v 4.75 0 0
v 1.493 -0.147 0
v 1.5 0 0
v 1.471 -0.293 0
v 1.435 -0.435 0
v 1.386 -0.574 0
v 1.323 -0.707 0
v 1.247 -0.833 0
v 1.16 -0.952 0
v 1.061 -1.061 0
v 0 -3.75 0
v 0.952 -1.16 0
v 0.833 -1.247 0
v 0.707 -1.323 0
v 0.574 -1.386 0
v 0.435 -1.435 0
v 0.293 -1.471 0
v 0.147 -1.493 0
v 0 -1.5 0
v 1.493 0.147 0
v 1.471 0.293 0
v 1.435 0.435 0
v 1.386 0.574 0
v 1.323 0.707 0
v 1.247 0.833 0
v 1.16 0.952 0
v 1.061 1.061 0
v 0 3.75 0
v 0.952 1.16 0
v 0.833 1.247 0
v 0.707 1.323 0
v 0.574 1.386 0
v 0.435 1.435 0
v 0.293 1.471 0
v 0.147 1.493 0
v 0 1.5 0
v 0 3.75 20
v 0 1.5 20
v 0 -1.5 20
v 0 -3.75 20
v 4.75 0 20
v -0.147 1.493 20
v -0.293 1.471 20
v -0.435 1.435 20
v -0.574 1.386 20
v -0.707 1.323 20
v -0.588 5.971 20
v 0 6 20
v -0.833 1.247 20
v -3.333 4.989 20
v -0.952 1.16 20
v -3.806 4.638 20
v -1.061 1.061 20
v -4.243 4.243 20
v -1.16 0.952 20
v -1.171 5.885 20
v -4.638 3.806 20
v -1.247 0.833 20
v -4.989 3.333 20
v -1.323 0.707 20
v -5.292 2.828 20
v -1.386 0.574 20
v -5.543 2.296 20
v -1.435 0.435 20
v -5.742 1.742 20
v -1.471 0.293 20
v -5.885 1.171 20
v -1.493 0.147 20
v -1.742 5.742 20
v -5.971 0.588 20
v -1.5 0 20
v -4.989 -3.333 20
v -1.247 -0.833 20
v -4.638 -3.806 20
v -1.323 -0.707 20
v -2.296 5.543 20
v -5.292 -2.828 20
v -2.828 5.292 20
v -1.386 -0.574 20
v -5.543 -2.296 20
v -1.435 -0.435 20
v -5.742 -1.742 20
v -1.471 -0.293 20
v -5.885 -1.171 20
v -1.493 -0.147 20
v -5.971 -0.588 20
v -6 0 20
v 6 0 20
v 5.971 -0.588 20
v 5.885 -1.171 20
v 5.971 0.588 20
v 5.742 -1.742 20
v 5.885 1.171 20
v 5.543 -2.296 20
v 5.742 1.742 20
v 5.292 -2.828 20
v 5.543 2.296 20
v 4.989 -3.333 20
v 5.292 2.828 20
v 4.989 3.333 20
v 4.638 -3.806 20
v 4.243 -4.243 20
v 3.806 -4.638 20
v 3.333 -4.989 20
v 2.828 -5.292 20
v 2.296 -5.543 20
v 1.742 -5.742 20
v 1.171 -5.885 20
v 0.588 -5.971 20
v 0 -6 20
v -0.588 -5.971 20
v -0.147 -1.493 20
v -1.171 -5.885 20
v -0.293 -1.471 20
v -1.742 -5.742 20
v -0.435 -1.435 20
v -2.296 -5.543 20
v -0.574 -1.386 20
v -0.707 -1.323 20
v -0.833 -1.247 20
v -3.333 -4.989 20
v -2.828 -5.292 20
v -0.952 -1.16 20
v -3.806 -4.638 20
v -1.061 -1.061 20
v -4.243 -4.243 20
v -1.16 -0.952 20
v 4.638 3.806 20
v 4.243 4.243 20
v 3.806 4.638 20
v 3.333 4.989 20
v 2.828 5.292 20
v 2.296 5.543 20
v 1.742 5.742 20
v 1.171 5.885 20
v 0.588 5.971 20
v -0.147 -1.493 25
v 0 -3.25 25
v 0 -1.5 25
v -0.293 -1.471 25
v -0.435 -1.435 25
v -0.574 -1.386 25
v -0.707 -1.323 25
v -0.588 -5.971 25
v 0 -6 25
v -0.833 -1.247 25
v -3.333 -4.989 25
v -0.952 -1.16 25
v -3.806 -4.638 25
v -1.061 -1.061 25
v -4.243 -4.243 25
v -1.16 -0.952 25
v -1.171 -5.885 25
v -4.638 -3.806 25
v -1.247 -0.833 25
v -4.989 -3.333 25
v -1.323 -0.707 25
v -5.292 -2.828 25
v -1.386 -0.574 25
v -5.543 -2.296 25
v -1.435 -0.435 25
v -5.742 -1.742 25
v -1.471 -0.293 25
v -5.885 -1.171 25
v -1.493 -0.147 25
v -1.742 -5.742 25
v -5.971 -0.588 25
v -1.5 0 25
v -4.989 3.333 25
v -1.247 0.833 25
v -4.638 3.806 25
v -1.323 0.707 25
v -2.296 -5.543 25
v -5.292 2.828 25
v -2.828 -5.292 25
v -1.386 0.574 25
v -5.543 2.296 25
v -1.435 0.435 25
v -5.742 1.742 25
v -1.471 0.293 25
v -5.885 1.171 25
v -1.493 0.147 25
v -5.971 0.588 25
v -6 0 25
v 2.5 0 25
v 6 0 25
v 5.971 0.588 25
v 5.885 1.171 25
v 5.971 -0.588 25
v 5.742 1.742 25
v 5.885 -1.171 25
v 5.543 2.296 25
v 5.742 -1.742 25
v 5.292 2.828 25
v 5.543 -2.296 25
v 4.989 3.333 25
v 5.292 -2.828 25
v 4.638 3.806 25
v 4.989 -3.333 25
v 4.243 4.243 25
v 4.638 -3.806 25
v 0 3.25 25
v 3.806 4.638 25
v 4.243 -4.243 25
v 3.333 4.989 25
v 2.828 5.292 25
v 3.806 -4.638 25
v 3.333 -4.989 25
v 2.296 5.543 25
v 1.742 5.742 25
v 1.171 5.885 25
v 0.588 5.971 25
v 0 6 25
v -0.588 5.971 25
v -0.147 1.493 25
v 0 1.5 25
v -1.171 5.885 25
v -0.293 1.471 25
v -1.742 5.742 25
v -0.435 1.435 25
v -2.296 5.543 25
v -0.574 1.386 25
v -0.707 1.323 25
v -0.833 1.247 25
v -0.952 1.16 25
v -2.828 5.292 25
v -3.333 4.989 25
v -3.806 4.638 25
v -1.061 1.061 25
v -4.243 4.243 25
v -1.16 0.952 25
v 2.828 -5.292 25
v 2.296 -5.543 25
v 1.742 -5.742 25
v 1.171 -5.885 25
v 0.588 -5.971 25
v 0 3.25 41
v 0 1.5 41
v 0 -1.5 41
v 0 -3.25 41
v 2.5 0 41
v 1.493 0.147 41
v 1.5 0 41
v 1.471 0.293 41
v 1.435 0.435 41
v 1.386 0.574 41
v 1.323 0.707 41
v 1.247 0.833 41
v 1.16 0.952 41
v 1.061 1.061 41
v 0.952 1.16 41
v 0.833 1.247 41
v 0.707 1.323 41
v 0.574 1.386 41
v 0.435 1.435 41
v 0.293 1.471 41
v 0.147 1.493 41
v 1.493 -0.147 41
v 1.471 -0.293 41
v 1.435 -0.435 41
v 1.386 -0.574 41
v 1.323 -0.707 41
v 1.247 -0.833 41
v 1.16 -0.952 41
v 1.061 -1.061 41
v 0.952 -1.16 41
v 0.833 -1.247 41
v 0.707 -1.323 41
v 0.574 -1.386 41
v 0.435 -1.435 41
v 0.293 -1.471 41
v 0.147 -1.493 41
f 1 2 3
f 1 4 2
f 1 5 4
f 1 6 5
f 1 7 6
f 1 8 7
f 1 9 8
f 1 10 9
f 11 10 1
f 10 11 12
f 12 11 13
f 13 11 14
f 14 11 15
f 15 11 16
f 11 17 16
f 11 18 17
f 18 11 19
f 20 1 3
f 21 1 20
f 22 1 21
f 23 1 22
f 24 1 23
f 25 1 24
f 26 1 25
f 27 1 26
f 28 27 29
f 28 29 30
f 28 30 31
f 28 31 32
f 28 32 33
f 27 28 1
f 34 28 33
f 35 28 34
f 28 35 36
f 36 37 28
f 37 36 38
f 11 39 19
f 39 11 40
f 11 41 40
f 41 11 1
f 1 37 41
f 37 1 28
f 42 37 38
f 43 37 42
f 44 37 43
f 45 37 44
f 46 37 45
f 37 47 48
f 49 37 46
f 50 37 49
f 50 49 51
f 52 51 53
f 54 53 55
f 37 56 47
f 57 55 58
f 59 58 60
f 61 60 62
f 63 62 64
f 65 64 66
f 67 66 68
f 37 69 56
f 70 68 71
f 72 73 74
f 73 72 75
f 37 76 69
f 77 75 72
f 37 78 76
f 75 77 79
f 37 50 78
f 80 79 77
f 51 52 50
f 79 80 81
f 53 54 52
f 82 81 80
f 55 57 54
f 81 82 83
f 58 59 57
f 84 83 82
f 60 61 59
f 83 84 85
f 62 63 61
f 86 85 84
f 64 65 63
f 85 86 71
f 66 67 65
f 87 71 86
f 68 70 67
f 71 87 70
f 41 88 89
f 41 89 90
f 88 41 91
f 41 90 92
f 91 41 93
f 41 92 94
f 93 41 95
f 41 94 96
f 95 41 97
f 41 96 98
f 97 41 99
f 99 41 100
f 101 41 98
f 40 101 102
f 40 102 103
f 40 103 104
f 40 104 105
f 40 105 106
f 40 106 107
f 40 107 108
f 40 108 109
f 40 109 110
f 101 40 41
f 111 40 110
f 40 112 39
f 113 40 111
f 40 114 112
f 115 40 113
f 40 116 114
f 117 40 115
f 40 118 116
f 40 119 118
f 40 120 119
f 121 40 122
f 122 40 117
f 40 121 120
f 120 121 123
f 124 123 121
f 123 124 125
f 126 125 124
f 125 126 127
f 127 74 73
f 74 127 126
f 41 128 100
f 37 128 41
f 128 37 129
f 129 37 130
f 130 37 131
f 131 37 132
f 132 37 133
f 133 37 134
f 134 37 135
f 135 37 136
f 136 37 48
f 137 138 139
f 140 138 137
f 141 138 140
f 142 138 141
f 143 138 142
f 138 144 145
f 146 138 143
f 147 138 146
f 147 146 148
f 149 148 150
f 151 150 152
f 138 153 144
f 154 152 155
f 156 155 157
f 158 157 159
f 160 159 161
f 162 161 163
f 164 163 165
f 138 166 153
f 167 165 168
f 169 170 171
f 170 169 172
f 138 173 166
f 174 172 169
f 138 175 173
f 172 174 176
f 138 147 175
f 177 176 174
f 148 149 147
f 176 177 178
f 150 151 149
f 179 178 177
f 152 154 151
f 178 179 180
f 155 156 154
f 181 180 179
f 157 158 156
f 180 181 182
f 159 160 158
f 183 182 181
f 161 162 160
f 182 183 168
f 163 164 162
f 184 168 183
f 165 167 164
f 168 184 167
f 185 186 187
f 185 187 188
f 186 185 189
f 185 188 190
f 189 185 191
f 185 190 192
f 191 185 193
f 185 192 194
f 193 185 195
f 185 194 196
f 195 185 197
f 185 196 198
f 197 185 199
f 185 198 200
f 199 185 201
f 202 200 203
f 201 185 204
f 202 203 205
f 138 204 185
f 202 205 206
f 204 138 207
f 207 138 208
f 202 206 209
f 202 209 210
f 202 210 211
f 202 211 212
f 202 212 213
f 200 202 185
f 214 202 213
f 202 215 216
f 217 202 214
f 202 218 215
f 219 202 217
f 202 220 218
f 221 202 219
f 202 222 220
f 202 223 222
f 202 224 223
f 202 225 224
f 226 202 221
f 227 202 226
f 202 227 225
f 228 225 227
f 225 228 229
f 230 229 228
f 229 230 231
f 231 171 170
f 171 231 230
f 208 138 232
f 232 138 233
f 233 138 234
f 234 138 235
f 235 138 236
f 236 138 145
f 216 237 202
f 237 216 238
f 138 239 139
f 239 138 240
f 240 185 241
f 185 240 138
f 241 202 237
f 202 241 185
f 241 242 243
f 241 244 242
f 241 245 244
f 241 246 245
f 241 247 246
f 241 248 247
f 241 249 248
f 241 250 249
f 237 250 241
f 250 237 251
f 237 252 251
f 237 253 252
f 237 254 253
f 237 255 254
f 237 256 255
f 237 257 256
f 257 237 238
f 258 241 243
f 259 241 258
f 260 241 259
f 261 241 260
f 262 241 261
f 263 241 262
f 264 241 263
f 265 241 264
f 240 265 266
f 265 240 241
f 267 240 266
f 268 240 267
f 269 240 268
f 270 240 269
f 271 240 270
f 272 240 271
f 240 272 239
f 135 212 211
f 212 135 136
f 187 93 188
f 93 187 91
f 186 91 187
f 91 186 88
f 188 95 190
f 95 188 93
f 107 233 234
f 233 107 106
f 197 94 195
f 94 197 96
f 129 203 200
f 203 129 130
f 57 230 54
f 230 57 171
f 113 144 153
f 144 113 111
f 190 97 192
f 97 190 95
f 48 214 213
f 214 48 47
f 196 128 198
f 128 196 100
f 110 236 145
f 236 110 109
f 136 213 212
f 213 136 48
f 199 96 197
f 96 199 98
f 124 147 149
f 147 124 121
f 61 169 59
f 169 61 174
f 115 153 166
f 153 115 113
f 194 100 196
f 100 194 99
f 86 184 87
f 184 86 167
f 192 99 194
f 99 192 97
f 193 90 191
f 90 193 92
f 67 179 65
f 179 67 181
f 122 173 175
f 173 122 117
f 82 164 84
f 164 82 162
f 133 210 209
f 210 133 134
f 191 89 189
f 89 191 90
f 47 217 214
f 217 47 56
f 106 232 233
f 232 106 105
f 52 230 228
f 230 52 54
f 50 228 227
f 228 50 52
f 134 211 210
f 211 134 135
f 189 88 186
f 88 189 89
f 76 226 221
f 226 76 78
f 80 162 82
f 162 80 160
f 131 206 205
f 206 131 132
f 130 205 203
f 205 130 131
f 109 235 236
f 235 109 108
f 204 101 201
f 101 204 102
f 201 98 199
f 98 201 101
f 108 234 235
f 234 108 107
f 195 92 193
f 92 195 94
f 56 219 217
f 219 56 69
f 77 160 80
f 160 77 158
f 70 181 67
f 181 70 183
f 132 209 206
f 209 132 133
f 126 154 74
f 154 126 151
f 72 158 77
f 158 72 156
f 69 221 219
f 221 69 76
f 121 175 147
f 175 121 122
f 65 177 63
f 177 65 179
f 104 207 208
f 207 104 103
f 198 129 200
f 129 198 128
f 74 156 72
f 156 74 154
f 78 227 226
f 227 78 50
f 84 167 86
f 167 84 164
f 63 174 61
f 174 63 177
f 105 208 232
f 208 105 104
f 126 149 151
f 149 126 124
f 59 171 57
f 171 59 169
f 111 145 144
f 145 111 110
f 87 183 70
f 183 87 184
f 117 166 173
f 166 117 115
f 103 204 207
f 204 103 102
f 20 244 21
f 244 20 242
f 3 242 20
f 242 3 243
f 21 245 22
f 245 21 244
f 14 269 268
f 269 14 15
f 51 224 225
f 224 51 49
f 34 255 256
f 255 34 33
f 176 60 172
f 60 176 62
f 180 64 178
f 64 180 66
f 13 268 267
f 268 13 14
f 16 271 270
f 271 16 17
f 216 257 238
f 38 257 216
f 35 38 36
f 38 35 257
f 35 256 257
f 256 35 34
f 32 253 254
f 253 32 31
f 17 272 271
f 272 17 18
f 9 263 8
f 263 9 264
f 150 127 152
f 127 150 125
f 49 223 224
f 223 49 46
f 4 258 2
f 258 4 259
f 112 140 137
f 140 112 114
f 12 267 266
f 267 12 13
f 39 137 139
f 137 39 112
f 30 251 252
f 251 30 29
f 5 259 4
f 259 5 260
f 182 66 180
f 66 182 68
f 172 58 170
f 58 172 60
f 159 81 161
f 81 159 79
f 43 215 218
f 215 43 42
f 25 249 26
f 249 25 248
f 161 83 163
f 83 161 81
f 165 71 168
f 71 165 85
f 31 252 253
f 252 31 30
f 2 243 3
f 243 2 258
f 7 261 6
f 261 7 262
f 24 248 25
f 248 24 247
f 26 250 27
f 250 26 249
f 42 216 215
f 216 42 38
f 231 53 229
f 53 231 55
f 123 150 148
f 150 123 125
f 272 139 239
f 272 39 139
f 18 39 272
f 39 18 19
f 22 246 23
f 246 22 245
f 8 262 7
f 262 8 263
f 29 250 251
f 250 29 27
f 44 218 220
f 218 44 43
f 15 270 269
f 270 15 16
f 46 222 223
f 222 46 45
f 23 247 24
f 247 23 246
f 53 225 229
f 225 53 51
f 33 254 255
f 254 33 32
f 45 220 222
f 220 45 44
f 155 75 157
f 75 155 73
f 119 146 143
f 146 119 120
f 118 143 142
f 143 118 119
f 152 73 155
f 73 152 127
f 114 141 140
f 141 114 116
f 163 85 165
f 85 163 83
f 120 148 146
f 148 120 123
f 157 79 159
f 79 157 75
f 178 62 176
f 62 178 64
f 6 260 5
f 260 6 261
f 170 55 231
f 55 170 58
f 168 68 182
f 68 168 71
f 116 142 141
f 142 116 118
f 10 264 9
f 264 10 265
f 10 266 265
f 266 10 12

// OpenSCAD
// Hose-barb reducer: 8 mm tubing (barbs) to 5 mm tubing (barbs)
// Print orientation: standing upright along Z

$fn = 64;

// ---- Dimensions (mm) ----
tube_8_d      = 8;    // inner diameter of 8 mm tubing
tube_5_d      = 5;    // inner diameter of 5 mm tubing
bore_d        = 3;    // through-bore diameter
barb_h_8      = 10;   // height of each 8 mm barb
barb_od_8_bot = 7.5;  // outer diameter of 8 mm barb at bottom
barb_od_8_top = 9.5;  // outer diameter of 8 mm barb at top
barb_count_8  = 2;    // number of 8 mm barbs (stacked)

collar_d      = 12;   // collar diameter
collar_h      = 5;    // collar height (z = 20 to 25)

barb_h_5      = 8;    // height of each 5 mm barb
barb_od_5_bot = 6.5;  // outer diameter of 5 mm barb at bottom
barb_od_5_top = 5.0;  // outer diameter of 5 mm barb at top
barb_count_5  = 2;    // number of 5 mm barbs (stacked)

eps           = 0.5;  // overshoot for clean cuts

// ---- Derived ----
z_8 = 20;             // bottom of collar
z_5 = z_8 + collar_h; // bottom of 5 mm barbs (z = 25)

// ---- Model ----
difference() {
    union() {
        // 8 mm barbs: sawtooth profile, stacked
        for (i = [0 : barb_count_8 - 1])
            translate([0, 0, i * barb_h_8])
                linear_extrude(height = barb_h_8)
                    polygon([
                        [0, barb_od_8_bot / 2],
                        [0, -barb_od_8_bot / 2],
                        [barb_od_8_top / 2, 0]
                    ]);

        // Collar
        translate([0, 0, z_8])
            cylinder(d = collar_d, h = collar_h);

        // 5 mm barbs: conical then stepped back out, stacked
        for (i = [0 : barb_count_5 - 1])
            translate([0, 0, z_5 + i * barb_h_5])
                linear_extrude(height = barb_h_5)
                    polygon([
                        [0, barb_od_5_bot / 2],
                        [0, -barb_od_5_bot / 2],
                        [barb_od_5_top / 2, 0]
                    ]);
    }

    // Through bore
    translate([0, 0, -eps])
        cylinder(d = bore_d, h = z_5 + collar_h + barb_count_5 * barb_h_5 + 2 * eps);
}
